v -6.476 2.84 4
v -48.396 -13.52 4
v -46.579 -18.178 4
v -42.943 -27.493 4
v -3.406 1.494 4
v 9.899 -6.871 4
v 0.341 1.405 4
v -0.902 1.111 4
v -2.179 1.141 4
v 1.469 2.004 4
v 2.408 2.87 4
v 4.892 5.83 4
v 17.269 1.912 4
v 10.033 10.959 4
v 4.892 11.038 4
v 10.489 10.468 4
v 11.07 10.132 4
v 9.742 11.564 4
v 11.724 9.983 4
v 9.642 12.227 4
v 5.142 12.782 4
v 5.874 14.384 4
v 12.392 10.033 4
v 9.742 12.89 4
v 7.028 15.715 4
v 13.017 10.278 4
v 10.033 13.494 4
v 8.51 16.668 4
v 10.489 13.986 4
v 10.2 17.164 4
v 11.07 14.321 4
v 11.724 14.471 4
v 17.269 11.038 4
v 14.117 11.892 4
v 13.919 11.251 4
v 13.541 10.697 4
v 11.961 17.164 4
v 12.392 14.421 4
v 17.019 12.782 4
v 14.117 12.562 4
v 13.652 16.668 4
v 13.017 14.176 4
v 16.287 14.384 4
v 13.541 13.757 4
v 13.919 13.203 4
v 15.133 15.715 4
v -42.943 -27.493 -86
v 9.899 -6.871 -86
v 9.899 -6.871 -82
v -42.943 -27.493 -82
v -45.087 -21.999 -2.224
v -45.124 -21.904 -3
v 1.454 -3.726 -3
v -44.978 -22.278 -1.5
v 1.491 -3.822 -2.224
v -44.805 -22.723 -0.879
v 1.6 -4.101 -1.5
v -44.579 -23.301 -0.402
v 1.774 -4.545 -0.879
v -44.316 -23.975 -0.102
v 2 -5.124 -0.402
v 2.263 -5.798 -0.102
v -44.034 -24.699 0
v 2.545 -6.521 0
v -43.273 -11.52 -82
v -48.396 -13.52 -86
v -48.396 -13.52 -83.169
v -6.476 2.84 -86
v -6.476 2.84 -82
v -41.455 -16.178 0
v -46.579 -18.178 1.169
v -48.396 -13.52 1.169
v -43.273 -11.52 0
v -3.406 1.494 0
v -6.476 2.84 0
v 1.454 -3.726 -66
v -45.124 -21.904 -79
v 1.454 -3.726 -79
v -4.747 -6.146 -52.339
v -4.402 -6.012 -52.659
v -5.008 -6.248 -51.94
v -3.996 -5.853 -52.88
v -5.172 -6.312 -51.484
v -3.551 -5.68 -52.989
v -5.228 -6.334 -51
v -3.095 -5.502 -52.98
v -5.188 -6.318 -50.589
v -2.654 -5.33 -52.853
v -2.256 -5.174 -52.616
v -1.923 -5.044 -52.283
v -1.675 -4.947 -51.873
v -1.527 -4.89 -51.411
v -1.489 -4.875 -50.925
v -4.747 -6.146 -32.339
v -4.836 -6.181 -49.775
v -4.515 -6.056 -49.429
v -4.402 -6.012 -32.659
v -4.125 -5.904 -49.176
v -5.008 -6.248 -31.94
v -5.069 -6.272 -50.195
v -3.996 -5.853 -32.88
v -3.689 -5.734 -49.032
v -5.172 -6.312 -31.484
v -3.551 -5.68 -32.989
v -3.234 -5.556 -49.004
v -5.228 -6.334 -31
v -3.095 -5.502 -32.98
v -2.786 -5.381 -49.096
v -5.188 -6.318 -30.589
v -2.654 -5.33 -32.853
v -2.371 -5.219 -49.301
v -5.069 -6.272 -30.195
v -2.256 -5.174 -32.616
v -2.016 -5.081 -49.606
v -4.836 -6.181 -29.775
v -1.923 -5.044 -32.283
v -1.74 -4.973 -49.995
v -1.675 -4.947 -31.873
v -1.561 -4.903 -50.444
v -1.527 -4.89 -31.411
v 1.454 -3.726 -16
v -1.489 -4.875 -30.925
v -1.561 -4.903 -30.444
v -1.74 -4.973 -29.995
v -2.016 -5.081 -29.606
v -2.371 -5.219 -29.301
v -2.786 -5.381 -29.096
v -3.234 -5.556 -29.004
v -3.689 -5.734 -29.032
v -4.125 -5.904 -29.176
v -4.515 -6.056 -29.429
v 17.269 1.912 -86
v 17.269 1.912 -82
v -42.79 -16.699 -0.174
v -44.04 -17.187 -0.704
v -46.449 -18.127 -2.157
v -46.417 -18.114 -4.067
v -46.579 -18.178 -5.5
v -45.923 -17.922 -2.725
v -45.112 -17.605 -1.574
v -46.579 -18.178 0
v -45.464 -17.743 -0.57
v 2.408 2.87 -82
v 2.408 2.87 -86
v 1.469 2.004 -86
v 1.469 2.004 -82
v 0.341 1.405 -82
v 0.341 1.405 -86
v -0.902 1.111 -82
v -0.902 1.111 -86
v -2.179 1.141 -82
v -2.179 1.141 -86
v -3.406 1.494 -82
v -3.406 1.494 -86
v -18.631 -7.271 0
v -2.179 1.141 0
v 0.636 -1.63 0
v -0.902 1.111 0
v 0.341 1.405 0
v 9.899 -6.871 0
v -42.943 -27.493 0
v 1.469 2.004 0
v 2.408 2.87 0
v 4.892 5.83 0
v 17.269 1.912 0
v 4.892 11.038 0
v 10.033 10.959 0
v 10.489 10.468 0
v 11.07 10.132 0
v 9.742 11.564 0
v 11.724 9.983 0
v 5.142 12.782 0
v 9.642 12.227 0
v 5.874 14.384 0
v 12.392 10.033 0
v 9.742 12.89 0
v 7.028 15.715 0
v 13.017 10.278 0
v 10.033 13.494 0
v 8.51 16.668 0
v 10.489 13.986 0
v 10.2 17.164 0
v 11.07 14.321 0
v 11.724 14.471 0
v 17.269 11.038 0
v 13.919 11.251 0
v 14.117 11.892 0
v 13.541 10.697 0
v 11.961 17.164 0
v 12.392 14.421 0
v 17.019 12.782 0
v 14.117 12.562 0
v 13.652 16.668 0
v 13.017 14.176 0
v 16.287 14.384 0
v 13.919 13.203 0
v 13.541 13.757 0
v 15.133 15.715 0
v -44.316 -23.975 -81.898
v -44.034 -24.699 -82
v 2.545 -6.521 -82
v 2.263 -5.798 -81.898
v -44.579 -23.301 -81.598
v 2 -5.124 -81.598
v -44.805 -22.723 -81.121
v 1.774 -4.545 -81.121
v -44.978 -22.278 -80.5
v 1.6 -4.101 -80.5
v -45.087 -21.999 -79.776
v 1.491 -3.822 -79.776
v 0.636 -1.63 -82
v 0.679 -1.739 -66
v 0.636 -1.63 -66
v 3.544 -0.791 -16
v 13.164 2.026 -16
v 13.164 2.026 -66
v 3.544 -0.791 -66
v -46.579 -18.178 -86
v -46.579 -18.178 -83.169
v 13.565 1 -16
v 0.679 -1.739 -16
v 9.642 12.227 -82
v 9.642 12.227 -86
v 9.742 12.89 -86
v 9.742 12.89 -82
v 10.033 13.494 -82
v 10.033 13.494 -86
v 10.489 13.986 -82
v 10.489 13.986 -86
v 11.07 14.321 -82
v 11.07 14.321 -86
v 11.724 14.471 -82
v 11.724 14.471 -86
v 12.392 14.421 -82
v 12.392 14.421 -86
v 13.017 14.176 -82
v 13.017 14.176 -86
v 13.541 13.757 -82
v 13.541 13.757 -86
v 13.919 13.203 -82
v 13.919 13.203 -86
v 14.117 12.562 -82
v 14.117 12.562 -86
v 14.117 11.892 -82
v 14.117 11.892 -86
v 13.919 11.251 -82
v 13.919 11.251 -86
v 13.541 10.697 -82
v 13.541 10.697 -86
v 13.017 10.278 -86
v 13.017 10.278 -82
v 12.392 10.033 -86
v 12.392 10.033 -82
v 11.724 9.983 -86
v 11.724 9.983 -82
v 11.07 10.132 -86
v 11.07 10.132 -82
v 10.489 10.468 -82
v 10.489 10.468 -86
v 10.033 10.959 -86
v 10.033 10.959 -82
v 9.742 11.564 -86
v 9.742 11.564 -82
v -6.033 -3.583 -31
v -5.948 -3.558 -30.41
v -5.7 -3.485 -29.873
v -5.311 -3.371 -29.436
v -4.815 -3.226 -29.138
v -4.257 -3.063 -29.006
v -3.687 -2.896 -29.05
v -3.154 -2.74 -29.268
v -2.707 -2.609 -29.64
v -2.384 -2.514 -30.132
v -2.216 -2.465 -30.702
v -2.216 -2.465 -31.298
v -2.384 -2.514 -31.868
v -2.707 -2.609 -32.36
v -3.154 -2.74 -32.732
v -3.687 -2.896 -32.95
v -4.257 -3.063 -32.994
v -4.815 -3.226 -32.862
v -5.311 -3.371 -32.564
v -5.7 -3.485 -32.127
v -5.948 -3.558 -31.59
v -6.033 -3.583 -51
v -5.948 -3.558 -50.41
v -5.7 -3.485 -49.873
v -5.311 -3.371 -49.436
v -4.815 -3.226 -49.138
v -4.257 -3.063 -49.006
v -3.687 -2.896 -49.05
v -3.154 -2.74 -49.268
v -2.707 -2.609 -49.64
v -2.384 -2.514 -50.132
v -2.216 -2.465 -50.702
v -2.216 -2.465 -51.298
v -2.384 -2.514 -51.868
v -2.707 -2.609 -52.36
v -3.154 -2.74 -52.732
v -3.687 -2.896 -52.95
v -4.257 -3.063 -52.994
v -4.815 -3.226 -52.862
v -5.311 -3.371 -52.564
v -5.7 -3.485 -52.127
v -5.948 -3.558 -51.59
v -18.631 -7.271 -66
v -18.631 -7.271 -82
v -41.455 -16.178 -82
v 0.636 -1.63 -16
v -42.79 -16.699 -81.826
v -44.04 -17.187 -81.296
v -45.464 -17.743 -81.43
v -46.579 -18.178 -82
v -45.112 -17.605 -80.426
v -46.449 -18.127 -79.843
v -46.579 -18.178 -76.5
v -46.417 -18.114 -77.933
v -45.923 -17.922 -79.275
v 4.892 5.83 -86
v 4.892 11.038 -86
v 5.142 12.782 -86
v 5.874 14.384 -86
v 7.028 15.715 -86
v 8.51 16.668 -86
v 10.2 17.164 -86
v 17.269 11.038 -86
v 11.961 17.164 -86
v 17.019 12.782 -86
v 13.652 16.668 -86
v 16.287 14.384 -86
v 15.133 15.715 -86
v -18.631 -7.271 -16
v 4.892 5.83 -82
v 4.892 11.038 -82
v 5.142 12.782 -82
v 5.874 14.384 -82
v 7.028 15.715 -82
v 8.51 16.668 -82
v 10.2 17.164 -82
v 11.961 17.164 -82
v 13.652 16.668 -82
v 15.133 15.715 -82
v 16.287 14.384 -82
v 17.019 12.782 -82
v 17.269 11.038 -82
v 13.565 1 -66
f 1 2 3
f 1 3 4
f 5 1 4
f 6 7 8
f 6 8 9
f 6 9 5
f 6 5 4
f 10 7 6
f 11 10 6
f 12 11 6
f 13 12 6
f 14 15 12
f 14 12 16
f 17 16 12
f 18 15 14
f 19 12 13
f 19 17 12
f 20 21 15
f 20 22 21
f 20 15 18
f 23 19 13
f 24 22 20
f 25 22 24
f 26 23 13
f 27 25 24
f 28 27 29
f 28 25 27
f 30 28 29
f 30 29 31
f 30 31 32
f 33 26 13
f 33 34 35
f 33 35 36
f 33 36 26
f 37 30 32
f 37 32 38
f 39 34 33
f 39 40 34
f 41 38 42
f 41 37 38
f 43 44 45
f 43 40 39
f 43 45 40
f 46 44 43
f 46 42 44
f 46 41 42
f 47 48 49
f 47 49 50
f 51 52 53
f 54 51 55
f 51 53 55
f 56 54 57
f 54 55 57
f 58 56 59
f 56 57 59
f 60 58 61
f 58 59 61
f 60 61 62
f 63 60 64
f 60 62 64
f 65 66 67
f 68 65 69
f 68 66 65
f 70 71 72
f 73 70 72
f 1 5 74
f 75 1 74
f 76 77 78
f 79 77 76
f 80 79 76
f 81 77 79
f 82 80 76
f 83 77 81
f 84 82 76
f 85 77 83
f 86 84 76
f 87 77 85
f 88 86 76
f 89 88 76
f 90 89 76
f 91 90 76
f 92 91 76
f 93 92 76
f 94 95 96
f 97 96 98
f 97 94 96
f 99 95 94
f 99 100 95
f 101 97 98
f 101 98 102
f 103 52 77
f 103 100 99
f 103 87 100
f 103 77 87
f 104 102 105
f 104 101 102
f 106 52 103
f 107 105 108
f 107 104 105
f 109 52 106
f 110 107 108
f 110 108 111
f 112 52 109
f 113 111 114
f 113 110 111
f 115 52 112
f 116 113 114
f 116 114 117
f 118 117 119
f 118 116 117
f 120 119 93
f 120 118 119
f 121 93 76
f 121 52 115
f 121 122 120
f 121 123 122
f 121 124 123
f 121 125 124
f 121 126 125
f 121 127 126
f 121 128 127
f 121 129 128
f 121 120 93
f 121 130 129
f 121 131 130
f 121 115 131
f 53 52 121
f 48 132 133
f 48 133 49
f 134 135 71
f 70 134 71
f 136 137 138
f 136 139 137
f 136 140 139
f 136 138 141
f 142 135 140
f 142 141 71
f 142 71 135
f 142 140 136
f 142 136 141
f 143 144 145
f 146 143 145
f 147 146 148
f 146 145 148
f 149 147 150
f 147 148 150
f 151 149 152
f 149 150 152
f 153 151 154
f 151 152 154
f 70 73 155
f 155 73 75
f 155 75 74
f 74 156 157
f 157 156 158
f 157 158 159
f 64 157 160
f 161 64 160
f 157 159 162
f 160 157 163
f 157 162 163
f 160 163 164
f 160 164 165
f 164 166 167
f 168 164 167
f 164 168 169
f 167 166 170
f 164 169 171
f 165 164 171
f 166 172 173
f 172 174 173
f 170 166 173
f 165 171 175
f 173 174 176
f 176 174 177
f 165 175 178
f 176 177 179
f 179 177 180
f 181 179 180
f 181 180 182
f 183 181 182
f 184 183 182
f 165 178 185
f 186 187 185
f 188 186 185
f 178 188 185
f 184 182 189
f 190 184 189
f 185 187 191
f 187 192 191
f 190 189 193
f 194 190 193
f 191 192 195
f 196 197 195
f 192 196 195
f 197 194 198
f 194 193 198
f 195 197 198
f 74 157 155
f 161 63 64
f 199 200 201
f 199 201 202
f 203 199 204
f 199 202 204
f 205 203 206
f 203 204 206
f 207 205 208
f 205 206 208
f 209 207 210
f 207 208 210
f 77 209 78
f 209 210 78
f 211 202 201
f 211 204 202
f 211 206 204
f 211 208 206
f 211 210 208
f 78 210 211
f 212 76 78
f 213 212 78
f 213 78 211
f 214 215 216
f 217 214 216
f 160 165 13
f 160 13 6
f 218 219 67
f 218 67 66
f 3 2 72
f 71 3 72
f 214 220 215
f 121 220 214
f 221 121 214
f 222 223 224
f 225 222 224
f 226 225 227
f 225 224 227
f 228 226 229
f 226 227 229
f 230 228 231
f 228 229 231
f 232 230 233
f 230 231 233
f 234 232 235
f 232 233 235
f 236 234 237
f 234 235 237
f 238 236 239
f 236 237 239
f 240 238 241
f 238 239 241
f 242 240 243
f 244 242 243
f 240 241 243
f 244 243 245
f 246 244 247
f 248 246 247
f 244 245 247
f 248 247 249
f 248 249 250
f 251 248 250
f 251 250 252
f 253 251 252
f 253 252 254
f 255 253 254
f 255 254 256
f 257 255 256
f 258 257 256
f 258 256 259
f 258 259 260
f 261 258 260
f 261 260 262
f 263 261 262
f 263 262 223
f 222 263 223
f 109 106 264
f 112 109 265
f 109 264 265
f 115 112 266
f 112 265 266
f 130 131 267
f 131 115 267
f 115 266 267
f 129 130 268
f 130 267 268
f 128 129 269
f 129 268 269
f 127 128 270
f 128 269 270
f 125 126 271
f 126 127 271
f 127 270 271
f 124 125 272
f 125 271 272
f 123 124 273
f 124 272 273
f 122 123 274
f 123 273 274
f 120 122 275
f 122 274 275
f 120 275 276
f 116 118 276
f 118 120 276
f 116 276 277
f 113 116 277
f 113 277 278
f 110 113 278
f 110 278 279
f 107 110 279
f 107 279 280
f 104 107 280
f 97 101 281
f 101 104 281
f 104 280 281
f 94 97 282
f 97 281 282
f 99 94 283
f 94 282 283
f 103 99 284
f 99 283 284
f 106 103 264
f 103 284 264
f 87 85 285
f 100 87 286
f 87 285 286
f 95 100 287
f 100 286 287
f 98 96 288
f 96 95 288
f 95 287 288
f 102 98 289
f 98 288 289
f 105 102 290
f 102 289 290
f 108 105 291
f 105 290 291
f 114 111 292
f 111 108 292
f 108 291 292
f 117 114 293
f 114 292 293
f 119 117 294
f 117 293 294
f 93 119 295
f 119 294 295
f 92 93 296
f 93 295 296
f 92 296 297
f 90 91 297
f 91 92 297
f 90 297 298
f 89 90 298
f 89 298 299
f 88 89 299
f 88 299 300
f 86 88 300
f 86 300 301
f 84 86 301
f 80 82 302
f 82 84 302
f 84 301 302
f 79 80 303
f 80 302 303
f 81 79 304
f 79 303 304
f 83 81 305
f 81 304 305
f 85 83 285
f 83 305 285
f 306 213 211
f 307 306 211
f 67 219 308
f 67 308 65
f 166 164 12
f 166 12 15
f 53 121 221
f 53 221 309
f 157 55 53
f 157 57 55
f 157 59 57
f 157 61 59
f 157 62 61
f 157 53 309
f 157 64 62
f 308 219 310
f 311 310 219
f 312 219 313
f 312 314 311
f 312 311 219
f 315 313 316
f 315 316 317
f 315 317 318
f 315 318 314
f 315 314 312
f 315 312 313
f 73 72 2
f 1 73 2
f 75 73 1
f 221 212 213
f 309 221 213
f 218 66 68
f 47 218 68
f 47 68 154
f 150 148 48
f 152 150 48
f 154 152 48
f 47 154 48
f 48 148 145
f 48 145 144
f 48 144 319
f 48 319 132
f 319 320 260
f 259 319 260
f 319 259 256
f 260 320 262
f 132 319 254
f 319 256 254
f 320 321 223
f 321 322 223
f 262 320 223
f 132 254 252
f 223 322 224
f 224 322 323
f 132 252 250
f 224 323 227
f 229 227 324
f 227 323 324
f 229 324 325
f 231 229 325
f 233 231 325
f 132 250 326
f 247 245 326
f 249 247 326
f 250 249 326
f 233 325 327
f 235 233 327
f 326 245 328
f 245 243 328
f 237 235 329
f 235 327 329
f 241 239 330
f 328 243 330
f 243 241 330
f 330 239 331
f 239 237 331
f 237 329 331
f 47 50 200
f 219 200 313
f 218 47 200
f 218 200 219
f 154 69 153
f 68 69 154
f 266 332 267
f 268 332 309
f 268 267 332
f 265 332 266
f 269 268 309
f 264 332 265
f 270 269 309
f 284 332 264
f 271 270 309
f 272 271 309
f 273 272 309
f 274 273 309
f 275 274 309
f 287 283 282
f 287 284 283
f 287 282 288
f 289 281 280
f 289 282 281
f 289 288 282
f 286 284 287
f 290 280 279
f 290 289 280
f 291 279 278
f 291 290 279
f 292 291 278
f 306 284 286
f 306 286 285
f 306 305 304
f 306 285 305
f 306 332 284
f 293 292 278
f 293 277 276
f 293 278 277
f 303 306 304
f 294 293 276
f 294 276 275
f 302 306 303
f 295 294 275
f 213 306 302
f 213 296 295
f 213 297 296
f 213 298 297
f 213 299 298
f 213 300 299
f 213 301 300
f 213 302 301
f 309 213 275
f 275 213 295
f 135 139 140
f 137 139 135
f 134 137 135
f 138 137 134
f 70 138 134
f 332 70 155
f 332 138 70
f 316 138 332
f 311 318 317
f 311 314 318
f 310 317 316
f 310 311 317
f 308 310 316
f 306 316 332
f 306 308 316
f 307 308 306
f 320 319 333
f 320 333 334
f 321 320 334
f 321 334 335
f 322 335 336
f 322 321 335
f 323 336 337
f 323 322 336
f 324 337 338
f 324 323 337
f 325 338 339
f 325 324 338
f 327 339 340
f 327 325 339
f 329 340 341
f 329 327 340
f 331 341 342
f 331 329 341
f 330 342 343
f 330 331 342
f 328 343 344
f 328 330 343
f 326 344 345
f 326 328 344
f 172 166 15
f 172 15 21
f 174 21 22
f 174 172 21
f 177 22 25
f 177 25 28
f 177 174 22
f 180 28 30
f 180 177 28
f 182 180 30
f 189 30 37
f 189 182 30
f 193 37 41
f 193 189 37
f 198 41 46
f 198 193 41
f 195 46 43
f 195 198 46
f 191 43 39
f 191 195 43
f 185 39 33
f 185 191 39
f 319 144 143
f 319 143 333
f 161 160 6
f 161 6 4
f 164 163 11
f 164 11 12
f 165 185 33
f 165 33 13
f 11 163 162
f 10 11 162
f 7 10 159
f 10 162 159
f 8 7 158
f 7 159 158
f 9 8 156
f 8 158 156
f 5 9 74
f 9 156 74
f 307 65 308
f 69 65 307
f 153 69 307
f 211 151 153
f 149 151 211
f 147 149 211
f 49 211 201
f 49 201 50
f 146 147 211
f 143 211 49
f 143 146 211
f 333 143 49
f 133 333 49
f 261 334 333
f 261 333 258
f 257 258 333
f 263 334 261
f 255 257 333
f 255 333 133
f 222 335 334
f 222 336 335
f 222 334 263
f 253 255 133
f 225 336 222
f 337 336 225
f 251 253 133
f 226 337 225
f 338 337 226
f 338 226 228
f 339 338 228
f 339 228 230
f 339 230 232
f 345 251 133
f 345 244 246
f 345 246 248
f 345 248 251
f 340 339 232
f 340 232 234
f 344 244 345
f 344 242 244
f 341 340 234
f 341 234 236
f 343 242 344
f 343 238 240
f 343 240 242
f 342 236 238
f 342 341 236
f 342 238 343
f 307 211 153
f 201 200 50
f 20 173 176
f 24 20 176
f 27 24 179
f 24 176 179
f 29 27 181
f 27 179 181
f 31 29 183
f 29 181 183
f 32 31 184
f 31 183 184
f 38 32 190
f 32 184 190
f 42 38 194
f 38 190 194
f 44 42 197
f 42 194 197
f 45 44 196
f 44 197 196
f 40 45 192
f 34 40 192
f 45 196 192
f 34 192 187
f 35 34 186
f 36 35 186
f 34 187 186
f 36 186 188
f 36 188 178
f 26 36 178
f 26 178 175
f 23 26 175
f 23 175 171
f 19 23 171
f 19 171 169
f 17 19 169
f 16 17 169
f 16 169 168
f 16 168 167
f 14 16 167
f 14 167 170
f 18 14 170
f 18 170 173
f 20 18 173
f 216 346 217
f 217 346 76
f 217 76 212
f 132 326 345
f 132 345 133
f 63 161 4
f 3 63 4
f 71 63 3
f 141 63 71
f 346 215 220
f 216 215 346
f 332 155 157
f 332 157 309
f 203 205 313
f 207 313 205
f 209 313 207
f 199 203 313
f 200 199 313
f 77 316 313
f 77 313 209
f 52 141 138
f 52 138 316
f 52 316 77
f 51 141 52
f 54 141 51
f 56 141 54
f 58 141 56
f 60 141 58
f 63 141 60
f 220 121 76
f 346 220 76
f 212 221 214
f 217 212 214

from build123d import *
from OCP.BRepFilletAPI import BRepFilletAPI_MakeChamfer

# Parameters (mm, degrees)
ESTRUSIONE_ESTRUSIONE1_DEPTH = 4
ESTRUSIONE_ESTRUSIONE2_DEPTH = 82
ESTRUSIONE_ESTRUSIONE3_START = 4
ESTRUSIONE_ESTRUSIONE3_DEPTH = 4
FORO_PER_VITE_M4_1_D         = 4.5
FORO_PER_VITE_M4_1_DEPTH     = 188
FORO_PER_VITE_M4_1_TIP       = 1.351936393
SCHIZZO6_W                   = 50
SCHIZZO6_H                   = 4
ESTRUSIONE_ESTRUSIONE4_DEPTH = 5
SMUSSO1_SIZE                 = 5.5
SMUSSO1_SIZE2                = 1.169061089
RACCORDO1_R                  = 3
SMUSSO2_SIZE                 = 5
RACCORDO2_START              = -86
RACCORDO2_DEPTH              = 4
RACCORDO2_2_DEPTH            = 4
SCHIZZO7_W                   = 50
SCHIZZO7_H                   = 2.5
ESTRUSIONE_ESTRUSIONE5_DEPTH = 13
SMUSSO3_SIZE                 = 20
SMUSSO3_SIZE_2               = 1.048155586
SMUSSO4_SIZE                 = 20
SMUSSO4_SIZE2                = 1.749773271
SMUSSO5_SIZE                 = 10
SMUSSO5_SIZE2                = 0.350328071
SCHIZZO8_R                   = 2
TAGLIO_ESTRUSIONE1_DEPTH     = 10


with BuildPart() as part:
    # Schizzo1 → Estrusione-Estrusione1 (new body)
    with BuildSketch(Plane.XY):
        with BuildLine():
            Line((4.891723927, 5.829729564), (4.891723927, 11.038087105))
            ThreePointArc((4.891723927, 11.038087105), (11.08058435, 17.226947528), (17.269444773, 11.038087105))
            Line((17.269444773, 11.038087105), (17.269444773, 1.912236928))
            Line((17.269444773, 1.912236928), (9.899185428, -6.871296125))
            Line((9.899185428, -6.871296125), (-42.94312967, -27.493410377))
            Line((-42.94312967, -27.493410377), (-46.57866514, -18.177677349))
            Line((-46.57866514, -18.177677349), (0, 0))
            Line((0, 0), (4.891723927, 5.829729564))
        make_face()
    extrude(amount=ESTRUSIONE_ESTRUSIONE1_DEPTH)

    # Schizzo4 → Estrusione-Estrusione2 (add)
    with BuildSketch(Plane.XY):
        Polygon((-45.124450952, -21.90397056), (1.454214188, -3.726293211), (0, 0), (-46.57866514, -18.177677349), align=None)
    extrude(amount=-ESTRUSIONE_ESTRUSIONE2_DEPTH)

    # Schizzo5 → Estrusione-Estrusione3 (add)
    with BuildSketch(Plane(origin=(0, 0, -82), x_dir=(-1, 0, 0), z_dir=(0, 0, -1)).offset(ESTRUSIONE_ESTRUSIONE3_START)):
        with BuildLine():
            Line((42.94312967, -27.493410377), (46.57866514, -18.177677349))
            Line((46.57866514, -18.177677349), (0, 0))
            Line((0, 0), (-4.891723927, 5.829729564))
            Line((-4.891723927, 5.829729564), (-4.891723927, 11.038087105))
            ThreePointArc((-4.891723927, 11.038087105), (-11.08058435, 17.226947528), (-17.269444773, 11.038087105))
            Line((-17.269444773, 11.038087105), (-17.269444773, 1.912236928))
            Line((-17.269444773, 1.912236928), (-9.899185428, -6.871296125))
            Line((-9.899185428, -6.871296125), (42.94312967, -27.493410377))
        make_face()
    extrude(amount=-ESTRUSIONE_ESTRUSIONE3_DEPTH)

    # Foro per Vite M4-1
    with Locations(Plane.XY.offset(4)):
        with Locations((11.891723927, 12.226947528)):
            Hole(FORO_PER_VITE_M4_1_D / 2, depth=FORO_PER_VITE_M4_1_DEPTH)
            with Locations((0, 0, -(FORO_PER_VITE_M4_1_DEPTH + FORO_PER_VITE_M4_1_TIP / 2))):  # 118° drill point
                Cone(0, FORO_PER_VITE_M4_1_D / 2, FORO_PER_VITE_M4_1_TIP, mode=Mode.SUBTRACT)

    # Schizzo6 → Estrusione-Estrusione4 (add)
    with BuildSketch(Plane(origin=(0, 0, 0), x_dir=(0.9315733027957475, 0.36355354697516373, 0), z_dir=(-0.36355354697516373, 0.9315733027957475, 0))):
        with Locations((-25, 84)):
            Rectangle(SCHIZZO6_W, SCHIZZO6_H)
        with Locations((-25, -2)):
            Rectangle(SCHIZZO6_W, SCHIZZO6_H)
    extrude(amount=ESTRUSIONE_ESTRUSIONE4_DEPTH)

    # Smusso1: one chamfer whose edges measure the first distance from different faces: ONE call of the kernel's chamfer builder (chamfer() names one face for all edges)
    smusso1_edges_1 = [part.edges().sort_by_distance(p)[0] for p in [
        (-47.487549007, -15.848744092, -82),
    ]]
    smusso1_side_1 = [part.faces().sort_by_distance(p)[0] for p in [
        (-24.198216437, -6.759905417, -82),
    ]]
    smusso1_edges_2 = [part.edges().sort_by_distance(p)[0] for p in [
        (-47.487549007, -15.848744092, 0),
    ]]
    smusso1_side_2 = [part.faces().sort_by_distance(p)[0] for p in [
        (-24.198216437, -6.759905417, 0),
    ]]
    smusso1 = BRepFilletAPI_MakeChamfer(part.part.solid().wrapped)
    for e in smusso1_edges_1:
        smusso1.Add(SMUSSO1_SIZE, SMUSSO1_SIZE2, e.wrapped, smusso1_side_1[0].wrapped)  # the first distance lies on this face
    for e in smusso1_edges_2:
        smusso1.Add(SMUSSO1_SIZE, SMUSSO1_SIZE2, e.wrapped, smusso1_side_2[0].wrapped)  # the first distance lies on this face
    add(Compound.cast(smusso1.Shape()), mode=Mode.REPLACE)

    # Raccordo1
    raccordo1_edges = [part.edges().sort_by_distance(p)[0] for p in [
        (-21.835118382, -12.815131886, -82),
        (-21.835118382, -12.815131886, 0),
    ]]
    fillet(raccordo1_edges, radius=RACCORDO1_R)

    # Smusso2
    smusso2_edges = [part.edges().sort_by_distance(p)[0] for p in [
        (-1.817767735, 4.657866514, 2),
        (-1.817767735, 4.657866514, -84),
    ]]
    chamfer(smusso2_edges, length=SMUSSO2_SIZE - 0.0001)  # a hair under: the kernel refuses the full size

    # Raccordo2: read off the stored shape, not the designer's step
    # Raccordo2 outline → Raccordo2 (add)
    with BuildSketch(Plane.XY.offset(RACCORDO2_START)):
        with BuildLine():
            Line((0, 0), (2.407895765, 2.869618428))
            ThreePointArc((2.407895765, 2.869618428), (-0.284030607, 1.214852073), (-3.430579557, 1.504591587))
            Line((-3.430579557, 1.504591587), (0, 0))
        make_face()
    extrude(amount=RACCORDO2_DEPTH)

    # Raccordo2 2 outline → Raccordo2 2 (add)
    with BuildSketch(Plane.XY):
        with BuildLine():
            Line((0, 0), (2.407895765, 2.869618428))
            ThreePointArc((2.407895765, 2.869618428), (-0.284030607, 1.214852073), (-3.430579557, 1.504591587))
            Line((-3.430579557, 1.504591587), (0, 0))
        make_face()
    extrude(amount=RACCORDO2_2_DEPTH)

    # Schizzo7 → Estrusione-Estrusione5 (add)
    with BuildSketch(Plane(origin=(0, 0, 0), x_dir=(0, 0, -1), z_dir=(0.9315733027957472, 0.3635535469751644, 0))):
        with Locations((41, -2.75)):
            Rectangle(SCHIZZO7_W, SCHIZZO7_H)
    extrude(amount=ESTRUSIONE_ESTRUSIONE5_DEPTH)

    # Smusso3
    # the kernel refuses this chamfer: 20, 1.048155586 mm, written as the material it takes off along each edge
    with BuildSketch(Plane(origin=(12.655783257, 3.328836156, -16), x_dir=(-0.9315733027957472, -0.3635535469751644, 0), z_dir=(0, 0, -1))) as smusso3_piece_1_section:
        Polygon((SMUSSO3_SIZE, 0), (0, -SMUSSO3_SIZE_2), (0, 0), align=None)
    smusso3_piece_1 = extrude(amount=50, mode=Mode.PRIVATE)
    smusso3_piece_1 = split(smusso3_piece_1, bisect_by=Plane(origin=(0.54533032, -1.397359954, -16), z_dir=(0.9315733027957472, 0.36355354697516445, 0)), keep=Keep.TOP, mode=Mode.PRIVATE)
    add(smusso3_piece_1, mode=Mode.SUBTRACT)

    # Smusso4
    smusso4_edges = [part.edges().sort_by_distance(p)[0] for p in [
        (0, 0, -41),
    ]]
    smusso4_side = [part.faces().sort_by_distance(p)[0] for p in [
        (-23.323124739, -9.102026325, -41),
    ]]
    chamfer(smusso4_edges, length=SMUSSO4_SIZE, length2=SMUSSO4_SIZE2, reference=smusso4_side[0])

    # Smusso5
    smusso5_edges = [part.edges().sort_by_distance(p)[0] for p in [
        (13.036843938, 2.352402395, -41),
    ]]
    smusso5_side = [part.faces().sort_by_distance(p)[0] for p in [
        (6.857772748, 0.306645312, -41),
    ]]
    chamfer(smusso5_edges, length=SMUSSO5_SIZE, length2=SMUSSO5_SIZE2, reference=smusso5_side[0])

    # Schizzo8 → Taglio-Estrusione1 (cut)
    with BuildSketch(Plane(origin=(0.489777192, -1.672892017, 0), x_dir=(0.9597141645441053, 0.2809781528400562, 0), z_dir=(-0.2809781528400562, 0.9597141645441053, 0))):
        with Locations(Location((-4.796849429, 31, 0), (0, 0, 180))):
            Circle(SCHIZZO8_R)
        with Locations(Location((-4.796849429, 51, 0), (0, 0, 180))):
            Circle(SCHIZZO8_R)
    extrude(amount=-TAGLIO_ESTRUSIONE1_DEPTH, mode=Mode.SUBTRACT)


solid = part.part
